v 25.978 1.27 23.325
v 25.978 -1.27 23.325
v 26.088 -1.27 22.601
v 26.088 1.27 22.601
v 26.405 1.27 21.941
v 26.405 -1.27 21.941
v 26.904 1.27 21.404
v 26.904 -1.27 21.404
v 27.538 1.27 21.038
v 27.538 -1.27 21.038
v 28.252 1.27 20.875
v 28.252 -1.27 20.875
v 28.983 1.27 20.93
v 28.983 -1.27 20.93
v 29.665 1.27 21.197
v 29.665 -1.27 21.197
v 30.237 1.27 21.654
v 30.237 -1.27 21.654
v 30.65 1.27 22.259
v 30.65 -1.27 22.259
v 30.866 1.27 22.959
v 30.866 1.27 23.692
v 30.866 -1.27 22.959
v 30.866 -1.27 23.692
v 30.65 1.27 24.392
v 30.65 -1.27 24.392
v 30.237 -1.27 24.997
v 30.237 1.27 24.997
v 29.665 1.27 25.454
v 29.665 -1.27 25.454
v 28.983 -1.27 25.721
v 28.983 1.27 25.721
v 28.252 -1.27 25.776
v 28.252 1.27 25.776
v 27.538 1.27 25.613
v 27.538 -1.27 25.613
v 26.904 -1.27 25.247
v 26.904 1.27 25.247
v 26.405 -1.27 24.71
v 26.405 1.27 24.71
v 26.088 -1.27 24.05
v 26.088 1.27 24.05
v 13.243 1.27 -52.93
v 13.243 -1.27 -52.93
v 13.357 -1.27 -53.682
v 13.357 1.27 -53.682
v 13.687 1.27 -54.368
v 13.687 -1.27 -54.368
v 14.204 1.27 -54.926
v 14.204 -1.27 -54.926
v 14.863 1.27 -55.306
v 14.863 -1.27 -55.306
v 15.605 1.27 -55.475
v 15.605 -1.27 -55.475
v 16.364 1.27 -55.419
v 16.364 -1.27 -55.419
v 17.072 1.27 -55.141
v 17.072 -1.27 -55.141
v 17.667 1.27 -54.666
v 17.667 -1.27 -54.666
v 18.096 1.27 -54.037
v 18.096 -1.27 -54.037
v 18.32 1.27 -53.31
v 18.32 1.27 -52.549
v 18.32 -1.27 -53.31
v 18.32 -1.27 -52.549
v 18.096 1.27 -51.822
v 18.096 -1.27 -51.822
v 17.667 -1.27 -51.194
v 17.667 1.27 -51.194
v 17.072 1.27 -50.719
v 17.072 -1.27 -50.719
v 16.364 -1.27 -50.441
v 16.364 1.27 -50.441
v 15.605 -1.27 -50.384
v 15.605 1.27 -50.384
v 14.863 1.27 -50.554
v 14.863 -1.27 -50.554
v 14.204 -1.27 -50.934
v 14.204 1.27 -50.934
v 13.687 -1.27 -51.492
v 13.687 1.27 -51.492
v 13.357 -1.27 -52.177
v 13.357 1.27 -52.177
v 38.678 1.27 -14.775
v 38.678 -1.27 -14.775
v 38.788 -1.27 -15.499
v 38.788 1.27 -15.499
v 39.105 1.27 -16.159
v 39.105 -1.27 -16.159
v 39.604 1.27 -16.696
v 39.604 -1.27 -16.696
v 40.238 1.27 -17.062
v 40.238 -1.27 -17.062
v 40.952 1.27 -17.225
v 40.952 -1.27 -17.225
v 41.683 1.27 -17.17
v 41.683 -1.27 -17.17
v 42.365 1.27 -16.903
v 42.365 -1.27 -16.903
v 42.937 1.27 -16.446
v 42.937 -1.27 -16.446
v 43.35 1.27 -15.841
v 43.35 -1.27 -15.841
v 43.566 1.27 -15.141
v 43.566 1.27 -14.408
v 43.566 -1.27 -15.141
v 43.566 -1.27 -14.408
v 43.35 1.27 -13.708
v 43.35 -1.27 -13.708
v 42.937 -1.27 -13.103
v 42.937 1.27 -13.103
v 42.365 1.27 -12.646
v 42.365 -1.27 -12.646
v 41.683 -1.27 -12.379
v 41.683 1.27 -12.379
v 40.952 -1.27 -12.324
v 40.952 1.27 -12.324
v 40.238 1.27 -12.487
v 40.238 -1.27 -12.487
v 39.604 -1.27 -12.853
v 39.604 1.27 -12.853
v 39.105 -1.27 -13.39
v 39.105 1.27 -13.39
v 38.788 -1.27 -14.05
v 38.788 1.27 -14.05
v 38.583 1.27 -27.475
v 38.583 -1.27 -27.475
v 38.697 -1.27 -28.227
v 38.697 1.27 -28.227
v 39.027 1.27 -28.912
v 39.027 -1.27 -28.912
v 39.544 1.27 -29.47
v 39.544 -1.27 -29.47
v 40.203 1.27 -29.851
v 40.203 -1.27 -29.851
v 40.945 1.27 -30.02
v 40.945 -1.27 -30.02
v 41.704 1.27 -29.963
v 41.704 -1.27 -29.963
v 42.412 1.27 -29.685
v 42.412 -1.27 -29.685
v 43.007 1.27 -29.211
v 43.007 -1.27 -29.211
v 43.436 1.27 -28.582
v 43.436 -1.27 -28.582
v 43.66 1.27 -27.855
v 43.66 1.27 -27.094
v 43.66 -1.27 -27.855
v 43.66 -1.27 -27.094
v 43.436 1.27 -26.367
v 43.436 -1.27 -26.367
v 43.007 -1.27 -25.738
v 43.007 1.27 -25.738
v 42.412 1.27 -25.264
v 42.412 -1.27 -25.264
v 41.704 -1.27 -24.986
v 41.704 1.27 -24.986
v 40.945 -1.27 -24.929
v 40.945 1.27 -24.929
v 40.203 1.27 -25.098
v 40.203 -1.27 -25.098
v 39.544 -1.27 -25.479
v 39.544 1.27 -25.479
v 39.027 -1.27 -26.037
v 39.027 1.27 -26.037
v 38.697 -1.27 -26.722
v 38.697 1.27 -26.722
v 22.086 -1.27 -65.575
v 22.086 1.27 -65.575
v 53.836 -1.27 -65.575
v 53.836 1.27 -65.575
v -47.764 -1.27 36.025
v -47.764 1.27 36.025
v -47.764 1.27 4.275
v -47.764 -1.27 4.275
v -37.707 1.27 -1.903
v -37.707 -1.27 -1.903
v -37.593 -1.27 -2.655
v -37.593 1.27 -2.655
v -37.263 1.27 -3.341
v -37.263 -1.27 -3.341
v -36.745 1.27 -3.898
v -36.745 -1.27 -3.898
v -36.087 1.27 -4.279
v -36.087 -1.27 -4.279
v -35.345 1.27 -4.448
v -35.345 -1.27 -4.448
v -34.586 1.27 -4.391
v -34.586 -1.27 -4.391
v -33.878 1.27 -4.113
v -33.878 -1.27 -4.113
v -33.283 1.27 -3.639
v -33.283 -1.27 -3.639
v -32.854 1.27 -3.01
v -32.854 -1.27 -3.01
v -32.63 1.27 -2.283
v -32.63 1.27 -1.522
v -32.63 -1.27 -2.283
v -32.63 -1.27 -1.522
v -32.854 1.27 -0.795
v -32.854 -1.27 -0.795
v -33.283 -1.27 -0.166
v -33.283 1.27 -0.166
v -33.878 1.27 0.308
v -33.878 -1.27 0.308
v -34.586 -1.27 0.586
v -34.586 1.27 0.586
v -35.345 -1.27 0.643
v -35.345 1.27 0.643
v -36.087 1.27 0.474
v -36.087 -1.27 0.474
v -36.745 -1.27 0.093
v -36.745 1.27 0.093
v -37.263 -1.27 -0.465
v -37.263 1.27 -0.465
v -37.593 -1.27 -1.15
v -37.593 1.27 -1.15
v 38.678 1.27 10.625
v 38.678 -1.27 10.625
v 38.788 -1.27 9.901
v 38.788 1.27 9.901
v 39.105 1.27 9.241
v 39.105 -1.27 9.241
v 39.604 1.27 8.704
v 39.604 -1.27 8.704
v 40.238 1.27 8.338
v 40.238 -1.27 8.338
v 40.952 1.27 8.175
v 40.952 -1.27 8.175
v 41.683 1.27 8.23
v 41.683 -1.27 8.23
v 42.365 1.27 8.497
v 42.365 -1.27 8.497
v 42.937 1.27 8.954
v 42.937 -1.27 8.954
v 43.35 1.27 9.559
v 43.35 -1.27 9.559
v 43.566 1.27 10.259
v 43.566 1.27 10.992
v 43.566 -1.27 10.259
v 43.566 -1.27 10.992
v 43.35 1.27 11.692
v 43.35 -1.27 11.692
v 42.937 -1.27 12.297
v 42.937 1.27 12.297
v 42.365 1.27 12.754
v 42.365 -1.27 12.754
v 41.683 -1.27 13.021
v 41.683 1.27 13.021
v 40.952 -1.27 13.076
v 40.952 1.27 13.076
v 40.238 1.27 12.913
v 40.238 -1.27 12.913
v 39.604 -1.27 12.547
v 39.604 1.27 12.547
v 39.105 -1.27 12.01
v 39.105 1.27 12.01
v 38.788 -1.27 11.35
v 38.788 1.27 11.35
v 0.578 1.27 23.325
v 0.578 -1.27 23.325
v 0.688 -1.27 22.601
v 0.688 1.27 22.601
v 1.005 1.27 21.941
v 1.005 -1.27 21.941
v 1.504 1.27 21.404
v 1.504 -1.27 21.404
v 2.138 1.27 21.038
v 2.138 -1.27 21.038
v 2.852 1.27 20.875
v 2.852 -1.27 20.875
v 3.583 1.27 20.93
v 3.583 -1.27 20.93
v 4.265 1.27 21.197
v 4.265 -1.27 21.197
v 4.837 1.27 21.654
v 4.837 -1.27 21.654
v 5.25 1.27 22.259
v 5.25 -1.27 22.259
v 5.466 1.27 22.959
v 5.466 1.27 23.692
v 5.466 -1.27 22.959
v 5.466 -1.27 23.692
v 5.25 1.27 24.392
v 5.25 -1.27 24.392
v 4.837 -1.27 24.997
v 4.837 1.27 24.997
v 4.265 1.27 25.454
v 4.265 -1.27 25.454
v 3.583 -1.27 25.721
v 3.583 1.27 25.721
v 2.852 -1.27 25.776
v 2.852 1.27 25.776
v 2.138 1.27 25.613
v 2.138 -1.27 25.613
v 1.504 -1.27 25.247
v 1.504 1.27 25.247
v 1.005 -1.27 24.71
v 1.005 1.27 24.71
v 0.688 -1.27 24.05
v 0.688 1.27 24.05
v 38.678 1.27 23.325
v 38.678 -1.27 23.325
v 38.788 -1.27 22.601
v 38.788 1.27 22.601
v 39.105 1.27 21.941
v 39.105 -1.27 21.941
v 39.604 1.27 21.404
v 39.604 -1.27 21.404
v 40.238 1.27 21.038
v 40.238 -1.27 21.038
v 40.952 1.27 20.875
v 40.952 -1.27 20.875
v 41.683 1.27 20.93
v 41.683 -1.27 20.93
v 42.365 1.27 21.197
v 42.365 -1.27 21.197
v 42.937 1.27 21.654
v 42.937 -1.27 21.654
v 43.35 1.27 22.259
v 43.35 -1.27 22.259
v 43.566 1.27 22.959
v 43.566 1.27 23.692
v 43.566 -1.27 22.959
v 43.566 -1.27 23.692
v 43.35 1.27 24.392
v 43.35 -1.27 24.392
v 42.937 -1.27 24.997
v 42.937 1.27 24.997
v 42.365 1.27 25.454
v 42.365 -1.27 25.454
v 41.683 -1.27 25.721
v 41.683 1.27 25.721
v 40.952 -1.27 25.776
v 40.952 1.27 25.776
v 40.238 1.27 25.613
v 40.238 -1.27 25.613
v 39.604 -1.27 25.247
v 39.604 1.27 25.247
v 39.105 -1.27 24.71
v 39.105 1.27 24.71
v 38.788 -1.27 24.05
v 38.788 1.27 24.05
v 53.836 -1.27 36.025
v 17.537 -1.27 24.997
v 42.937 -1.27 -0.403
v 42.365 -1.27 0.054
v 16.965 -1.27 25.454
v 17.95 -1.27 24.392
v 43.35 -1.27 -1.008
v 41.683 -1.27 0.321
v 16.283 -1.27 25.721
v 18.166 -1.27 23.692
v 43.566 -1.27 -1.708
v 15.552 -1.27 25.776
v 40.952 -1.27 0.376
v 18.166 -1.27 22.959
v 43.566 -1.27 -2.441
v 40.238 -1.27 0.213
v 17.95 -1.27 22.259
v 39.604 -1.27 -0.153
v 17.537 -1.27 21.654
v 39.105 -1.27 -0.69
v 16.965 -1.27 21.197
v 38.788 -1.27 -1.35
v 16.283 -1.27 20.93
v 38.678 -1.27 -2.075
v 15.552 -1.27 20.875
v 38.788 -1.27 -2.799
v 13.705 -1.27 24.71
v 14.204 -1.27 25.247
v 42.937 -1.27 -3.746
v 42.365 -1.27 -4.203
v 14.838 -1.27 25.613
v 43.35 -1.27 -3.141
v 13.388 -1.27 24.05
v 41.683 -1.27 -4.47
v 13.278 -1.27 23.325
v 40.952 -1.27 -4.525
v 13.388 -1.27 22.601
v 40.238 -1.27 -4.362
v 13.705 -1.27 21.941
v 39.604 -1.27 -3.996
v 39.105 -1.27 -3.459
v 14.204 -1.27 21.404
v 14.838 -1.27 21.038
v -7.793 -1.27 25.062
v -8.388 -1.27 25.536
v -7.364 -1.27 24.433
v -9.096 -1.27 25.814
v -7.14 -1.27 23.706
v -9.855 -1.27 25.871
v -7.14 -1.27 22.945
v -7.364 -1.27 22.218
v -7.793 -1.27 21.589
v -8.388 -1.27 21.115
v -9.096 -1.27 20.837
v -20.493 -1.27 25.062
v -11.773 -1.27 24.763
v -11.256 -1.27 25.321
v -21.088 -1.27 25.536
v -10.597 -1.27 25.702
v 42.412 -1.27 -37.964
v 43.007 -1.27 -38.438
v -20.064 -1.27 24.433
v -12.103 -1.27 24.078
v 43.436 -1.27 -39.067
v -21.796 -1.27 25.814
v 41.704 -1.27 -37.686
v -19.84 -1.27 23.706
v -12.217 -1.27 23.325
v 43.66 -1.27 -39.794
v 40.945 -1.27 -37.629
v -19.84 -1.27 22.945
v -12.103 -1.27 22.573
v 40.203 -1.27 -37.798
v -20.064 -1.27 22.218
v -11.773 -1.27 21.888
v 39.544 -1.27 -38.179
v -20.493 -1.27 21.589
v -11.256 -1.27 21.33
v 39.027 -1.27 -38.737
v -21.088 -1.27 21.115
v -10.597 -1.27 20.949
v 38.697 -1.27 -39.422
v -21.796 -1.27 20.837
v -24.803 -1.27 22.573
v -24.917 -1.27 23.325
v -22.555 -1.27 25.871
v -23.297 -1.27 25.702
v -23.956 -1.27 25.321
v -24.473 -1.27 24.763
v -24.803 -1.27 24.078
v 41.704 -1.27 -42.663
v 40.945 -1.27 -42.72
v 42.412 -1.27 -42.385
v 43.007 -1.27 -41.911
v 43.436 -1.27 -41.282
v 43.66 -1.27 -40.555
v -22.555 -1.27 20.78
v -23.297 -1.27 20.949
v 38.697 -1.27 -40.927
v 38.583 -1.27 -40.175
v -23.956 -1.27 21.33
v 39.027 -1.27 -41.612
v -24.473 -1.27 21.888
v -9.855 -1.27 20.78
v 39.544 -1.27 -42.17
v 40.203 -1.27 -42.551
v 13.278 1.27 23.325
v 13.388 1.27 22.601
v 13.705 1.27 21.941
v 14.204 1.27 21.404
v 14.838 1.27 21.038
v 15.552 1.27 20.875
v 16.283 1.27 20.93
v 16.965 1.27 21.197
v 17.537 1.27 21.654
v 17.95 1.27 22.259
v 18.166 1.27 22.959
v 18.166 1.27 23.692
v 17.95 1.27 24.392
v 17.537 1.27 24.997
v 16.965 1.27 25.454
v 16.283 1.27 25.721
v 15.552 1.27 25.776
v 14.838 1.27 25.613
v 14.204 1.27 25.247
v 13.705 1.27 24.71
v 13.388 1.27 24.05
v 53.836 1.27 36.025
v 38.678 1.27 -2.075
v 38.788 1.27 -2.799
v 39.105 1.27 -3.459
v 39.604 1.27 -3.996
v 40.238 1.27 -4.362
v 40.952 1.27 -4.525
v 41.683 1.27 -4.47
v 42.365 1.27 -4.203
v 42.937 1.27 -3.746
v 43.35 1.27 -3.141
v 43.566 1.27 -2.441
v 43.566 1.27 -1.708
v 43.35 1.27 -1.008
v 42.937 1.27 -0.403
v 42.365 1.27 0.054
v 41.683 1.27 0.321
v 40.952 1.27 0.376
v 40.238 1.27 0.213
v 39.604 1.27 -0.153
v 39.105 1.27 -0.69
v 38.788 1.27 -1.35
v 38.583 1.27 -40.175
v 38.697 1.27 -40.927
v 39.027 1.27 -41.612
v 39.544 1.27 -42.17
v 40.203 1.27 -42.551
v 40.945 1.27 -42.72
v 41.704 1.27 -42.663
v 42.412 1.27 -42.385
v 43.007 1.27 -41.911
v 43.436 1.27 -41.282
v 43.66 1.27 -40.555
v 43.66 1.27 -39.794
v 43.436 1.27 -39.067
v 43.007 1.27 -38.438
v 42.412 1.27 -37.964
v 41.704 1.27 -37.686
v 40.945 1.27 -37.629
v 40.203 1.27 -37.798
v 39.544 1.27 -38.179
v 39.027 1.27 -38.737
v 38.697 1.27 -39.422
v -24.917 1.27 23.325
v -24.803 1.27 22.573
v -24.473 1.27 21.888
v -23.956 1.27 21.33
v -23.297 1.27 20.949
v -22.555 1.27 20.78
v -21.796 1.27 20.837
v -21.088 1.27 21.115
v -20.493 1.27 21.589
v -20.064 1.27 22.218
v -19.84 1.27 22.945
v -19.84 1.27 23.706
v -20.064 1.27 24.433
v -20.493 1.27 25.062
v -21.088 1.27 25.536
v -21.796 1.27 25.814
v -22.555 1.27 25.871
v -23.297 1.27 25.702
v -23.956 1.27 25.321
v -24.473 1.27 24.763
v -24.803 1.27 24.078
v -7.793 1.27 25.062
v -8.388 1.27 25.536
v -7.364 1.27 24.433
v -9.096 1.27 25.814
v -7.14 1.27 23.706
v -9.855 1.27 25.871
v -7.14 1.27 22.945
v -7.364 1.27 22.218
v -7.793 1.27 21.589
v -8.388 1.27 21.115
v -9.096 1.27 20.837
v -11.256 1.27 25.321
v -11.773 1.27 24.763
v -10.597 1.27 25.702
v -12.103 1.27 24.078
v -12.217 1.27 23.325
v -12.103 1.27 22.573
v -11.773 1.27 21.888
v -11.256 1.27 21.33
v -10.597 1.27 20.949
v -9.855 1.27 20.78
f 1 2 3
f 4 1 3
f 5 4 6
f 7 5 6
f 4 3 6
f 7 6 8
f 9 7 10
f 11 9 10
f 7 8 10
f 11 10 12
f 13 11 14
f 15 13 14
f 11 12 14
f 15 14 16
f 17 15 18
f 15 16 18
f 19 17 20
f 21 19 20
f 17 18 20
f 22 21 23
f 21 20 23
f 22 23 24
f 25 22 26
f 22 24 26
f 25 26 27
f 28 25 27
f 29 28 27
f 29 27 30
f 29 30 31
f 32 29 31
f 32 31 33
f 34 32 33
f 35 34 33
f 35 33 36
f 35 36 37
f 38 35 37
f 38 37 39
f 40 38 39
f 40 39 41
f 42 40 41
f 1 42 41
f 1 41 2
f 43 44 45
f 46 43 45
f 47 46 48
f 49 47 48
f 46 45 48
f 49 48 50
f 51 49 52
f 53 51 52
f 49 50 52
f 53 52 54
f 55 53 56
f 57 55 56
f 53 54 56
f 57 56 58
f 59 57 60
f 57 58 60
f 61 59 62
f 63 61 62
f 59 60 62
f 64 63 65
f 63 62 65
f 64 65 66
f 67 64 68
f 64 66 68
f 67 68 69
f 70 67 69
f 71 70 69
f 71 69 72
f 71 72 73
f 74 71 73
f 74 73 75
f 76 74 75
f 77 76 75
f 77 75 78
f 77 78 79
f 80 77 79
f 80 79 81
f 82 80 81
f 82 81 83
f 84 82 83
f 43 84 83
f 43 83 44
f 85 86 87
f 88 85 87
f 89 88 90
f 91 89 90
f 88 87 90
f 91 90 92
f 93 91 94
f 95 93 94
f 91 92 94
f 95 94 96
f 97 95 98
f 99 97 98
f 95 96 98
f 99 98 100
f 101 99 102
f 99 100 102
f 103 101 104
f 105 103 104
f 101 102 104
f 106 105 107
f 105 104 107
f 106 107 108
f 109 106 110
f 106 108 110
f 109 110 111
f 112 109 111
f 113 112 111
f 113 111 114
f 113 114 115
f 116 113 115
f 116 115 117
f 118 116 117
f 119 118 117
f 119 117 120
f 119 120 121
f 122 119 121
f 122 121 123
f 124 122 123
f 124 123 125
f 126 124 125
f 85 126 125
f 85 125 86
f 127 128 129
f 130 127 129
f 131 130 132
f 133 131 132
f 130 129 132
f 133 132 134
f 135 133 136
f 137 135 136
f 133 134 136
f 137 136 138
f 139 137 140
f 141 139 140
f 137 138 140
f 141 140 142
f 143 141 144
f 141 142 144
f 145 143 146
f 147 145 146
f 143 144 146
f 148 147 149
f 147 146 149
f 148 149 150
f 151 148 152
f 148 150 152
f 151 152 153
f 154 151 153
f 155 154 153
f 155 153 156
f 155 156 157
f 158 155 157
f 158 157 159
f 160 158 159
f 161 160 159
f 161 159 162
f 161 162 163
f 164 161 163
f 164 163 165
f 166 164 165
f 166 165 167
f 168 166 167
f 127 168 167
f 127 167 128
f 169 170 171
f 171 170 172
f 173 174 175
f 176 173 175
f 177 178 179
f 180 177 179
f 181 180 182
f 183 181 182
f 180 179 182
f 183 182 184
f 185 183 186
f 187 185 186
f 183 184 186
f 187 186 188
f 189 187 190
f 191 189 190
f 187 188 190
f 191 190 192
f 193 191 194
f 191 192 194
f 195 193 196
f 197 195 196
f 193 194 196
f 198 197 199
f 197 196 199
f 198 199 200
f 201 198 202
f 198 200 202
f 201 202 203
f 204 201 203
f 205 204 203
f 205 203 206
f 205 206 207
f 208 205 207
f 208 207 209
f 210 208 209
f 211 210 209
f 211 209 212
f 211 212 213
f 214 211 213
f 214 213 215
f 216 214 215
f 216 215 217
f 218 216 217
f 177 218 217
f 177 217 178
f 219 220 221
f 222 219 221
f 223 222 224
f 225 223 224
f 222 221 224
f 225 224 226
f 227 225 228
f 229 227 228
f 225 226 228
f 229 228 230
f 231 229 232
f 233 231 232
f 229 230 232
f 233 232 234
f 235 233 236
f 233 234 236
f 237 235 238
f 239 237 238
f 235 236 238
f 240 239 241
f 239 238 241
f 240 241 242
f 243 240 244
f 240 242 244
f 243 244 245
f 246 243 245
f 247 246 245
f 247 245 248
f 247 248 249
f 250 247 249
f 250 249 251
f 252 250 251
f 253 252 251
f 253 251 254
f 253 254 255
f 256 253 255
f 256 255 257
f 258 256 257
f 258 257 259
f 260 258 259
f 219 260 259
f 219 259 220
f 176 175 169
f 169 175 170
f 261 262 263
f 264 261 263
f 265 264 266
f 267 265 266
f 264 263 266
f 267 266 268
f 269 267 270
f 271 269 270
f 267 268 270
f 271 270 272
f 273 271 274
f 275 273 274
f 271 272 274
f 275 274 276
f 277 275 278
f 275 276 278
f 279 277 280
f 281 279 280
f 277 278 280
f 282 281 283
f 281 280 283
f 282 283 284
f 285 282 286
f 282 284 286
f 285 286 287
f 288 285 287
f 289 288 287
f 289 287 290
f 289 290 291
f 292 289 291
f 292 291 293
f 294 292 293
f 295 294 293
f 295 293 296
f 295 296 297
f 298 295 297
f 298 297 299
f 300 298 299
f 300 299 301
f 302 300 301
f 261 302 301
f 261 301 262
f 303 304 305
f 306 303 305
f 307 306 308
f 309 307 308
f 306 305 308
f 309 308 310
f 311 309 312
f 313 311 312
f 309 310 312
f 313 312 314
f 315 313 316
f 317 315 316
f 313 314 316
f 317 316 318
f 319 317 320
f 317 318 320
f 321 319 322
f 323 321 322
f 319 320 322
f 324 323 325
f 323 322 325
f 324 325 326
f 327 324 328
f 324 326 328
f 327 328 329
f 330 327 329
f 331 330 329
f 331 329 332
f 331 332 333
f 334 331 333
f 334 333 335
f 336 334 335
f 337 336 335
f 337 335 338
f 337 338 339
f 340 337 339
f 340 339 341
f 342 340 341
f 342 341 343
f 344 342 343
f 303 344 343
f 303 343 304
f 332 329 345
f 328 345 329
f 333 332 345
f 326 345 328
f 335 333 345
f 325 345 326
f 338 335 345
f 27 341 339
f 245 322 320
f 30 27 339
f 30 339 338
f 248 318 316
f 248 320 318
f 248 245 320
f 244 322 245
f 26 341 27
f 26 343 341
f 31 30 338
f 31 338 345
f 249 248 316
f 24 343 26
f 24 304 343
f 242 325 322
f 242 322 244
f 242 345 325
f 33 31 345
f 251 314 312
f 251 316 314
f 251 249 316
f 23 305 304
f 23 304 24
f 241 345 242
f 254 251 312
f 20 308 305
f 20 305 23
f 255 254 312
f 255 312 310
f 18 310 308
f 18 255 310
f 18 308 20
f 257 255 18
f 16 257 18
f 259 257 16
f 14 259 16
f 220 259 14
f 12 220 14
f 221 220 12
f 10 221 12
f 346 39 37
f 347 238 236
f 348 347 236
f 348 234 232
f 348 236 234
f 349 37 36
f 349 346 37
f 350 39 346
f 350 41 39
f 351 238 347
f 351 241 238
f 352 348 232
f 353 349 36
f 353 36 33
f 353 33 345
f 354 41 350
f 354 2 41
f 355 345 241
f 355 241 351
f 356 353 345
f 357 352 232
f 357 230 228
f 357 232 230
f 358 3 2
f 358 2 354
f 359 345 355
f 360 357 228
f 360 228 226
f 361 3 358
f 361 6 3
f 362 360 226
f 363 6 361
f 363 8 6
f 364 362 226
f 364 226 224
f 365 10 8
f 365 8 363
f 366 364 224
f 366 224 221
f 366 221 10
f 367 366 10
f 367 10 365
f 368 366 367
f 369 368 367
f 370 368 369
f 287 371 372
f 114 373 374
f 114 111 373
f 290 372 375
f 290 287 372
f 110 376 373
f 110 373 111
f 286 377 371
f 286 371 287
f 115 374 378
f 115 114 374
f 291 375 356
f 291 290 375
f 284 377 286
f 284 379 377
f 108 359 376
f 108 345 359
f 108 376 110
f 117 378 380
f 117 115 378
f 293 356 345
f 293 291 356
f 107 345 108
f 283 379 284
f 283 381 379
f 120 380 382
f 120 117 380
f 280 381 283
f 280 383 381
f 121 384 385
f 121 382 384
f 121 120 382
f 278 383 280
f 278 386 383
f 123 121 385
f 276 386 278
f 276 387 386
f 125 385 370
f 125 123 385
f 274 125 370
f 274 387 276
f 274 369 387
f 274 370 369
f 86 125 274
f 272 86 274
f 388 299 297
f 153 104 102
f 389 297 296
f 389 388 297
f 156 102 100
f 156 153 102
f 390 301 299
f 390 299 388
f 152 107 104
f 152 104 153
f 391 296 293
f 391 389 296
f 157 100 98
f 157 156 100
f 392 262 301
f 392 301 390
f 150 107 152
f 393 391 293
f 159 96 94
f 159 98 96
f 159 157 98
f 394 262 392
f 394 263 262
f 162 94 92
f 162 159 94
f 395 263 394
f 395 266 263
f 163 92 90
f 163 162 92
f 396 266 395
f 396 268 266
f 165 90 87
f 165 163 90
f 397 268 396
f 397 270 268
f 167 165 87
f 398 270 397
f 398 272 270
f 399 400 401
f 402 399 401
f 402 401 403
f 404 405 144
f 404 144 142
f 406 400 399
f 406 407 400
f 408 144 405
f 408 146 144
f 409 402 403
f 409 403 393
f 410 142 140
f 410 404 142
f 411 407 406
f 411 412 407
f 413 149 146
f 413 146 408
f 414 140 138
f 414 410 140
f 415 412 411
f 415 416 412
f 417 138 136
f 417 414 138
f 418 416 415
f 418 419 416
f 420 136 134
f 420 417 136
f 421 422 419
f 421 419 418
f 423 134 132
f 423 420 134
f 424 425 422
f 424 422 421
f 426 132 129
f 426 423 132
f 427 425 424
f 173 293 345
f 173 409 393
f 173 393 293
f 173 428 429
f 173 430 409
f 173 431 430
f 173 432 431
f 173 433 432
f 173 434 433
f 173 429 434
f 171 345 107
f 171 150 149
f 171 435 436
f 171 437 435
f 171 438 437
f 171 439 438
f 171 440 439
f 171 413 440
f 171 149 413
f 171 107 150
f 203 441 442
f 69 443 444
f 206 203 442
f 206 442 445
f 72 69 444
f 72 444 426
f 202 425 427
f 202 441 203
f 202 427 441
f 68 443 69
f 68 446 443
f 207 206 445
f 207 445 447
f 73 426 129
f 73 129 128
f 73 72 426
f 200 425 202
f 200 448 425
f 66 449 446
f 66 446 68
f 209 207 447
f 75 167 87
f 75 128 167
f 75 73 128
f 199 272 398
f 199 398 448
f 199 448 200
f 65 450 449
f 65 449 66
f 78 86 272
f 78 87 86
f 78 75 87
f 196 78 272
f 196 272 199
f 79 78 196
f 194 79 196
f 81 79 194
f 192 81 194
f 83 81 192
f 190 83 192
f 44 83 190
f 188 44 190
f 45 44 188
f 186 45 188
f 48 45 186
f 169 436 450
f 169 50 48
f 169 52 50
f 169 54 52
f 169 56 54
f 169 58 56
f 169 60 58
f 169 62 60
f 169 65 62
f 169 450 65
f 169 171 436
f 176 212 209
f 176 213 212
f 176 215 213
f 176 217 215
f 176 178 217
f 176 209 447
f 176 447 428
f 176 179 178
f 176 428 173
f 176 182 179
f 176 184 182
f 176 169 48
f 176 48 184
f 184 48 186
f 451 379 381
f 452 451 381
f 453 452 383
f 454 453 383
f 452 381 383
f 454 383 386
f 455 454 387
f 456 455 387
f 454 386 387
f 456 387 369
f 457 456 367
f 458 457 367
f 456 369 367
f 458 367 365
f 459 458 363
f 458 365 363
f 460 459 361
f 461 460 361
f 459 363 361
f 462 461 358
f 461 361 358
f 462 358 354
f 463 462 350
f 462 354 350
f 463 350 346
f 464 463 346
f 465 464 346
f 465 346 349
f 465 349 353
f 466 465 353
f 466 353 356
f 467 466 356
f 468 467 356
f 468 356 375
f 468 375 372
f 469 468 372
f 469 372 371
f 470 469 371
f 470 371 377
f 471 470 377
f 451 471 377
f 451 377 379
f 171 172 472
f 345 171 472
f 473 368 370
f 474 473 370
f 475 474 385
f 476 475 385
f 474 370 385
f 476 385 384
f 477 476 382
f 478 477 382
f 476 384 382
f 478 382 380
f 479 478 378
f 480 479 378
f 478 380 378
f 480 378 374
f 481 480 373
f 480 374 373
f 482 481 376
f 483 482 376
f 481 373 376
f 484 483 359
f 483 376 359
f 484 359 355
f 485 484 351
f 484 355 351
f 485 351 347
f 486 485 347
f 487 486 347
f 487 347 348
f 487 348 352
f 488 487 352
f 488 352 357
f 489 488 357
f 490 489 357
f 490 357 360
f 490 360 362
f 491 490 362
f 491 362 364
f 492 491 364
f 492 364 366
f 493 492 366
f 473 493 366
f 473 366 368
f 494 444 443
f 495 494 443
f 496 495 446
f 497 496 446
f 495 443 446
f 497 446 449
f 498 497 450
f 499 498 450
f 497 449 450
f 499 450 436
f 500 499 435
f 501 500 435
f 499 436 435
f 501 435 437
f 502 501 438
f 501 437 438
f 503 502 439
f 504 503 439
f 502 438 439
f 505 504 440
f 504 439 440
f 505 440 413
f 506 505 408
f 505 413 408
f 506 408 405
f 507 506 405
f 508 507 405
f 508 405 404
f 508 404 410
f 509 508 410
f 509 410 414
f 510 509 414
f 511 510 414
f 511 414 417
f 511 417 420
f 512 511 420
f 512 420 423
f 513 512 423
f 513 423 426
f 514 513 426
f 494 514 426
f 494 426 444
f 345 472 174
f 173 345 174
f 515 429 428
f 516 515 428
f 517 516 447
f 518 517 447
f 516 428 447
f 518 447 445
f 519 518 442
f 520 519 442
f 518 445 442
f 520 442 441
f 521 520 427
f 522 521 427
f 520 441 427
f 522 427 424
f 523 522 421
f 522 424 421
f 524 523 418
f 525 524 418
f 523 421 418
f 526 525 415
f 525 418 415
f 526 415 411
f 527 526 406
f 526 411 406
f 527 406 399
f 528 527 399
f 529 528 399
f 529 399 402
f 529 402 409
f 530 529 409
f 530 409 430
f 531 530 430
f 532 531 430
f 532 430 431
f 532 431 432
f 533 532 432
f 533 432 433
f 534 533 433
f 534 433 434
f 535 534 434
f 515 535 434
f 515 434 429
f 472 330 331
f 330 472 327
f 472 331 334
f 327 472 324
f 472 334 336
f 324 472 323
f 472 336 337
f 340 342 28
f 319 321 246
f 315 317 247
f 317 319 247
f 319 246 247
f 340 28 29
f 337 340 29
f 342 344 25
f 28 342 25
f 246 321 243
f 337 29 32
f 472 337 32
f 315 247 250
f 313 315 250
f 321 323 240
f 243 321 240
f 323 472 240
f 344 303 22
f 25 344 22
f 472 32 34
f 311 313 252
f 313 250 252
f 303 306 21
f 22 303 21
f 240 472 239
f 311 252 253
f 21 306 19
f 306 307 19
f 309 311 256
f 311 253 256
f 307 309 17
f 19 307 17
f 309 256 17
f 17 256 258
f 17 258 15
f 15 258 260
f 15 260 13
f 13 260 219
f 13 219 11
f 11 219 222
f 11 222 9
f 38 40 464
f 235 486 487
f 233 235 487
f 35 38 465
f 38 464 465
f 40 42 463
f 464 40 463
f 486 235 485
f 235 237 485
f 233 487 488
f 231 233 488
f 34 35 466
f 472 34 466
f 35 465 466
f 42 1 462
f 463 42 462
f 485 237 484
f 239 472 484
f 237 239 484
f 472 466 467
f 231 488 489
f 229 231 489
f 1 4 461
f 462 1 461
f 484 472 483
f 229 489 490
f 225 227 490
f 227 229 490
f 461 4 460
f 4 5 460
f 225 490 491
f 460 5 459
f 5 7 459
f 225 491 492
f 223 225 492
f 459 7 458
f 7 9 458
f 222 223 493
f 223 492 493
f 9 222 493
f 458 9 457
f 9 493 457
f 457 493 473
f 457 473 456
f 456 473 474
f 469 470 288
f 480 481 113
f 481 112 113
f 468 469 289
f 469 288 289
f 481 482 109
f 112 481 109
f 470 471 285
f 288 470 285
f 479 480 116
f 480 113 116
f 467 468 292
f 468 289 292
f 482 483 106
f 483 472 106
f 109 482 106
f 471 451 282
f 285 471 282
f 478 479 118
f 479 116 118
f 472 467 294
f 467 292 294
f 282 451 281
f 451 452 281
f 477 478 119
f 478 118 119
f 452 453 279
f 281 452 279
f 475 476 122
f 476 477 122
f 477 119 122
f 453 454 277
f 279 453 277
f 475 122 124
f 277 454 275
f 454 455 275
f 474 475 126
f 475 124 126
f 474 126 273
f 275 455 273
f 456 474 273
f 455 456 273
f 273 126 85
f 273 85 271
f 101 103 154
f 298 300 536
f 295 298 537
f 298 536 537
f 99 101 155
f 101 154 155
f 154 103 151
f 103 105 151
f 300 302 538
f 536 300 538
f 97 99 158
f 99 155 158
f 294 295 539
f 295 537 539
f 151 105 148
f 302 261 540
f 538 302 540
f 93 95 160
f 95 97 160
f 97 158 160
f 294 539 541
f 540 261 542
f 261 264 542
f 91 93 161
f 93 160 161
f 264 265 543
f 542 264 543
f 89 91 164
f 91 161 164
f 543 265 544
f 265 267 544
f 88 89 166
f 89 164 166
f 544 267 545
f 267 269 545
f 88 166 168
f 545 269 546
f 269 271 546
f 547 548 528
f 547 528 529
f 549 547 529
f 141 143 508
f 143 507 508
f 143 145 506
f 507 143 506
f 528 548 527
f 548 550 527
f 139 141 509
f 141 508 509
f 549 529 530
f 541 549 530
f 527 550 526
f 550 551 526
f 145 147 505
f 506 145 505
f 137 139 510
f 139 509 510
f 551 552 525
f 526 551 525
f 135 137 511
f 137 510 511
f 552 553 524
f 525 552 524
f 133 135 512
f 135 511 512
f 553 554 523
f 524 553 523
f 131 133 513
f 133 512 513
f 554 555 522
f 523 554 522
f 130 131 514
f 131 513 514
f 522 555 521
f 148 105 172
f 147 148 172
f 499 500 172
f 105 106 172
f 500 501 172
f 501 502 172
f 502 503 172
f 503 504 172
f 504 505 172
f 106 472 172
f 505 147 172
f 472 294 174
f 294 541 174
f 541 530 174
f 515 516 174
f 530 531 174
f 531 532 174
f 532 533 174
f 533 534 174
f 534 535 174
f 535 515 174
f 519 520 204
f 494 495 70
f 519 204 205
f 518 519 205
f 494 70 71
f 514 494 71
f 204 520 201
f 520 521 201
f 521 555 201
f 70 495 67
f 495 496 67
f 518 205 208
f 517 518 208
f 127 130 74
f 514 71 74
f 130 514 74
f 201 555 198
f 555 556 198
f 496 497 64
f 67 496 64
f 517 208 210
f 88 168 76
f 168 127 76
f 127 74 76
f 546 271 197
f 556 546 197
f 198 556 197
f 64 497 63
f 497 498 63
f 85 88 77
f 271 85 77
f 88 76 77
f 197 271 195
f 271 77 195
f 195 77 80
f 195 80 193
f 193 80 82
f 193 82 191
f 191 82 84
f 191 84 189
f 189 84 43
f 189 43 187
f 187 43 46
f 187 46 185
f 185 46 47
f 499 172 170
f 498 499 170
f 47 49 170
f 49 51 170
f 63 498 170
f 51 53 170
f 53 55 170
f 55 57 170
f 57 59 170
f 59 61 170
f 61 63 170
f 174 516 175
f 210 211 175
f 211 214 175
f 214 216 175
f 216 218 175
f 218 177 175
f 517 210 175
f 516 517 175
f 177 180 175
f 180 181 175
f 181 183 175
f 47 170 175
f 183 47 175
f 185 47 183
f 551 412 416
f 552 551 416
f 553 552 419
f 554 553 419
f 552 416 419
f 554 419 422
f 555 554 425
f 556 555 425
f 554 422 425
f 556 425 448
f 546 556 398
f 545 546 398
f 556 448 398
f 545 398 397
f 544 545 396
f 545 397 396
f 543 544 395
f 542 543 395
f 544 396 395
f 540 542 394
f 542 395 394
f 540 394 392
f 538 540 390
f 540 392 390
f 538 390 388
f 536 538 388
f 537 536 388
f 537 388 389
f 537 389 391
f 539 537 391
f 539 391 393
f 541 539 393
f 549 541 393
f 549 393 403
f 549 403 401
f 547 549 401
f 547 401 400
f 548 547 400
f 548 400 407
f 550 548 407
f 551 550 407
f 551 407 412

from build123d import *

# Parameters (mm, degrees)
BOSS_EXTRUDE1_DEPTH          = 1.27
F_10_0_1935_DIAMETER_HOLE1_D = 4.9149
F_10_CLEARANCE_HOLE3_D       = 5.1054
SKETCH8_W                    = 182.273007985
SKETCH8_H                    = 142.759278982
SKETCH8_W_2                  = 101.6
SKETCH8_H_2                  = 101.6
CUT_EXTRUDE1_DEPTH           = 114.076021494


with BuildPart() as part:
    # Sketch1 → Boss-Extrude1 (new, symmetric)
    with BuildSketch(Plane(origin=(0, 0, 0), x_dir=(1, 0, 0), z_dir=(0, 1, 0))):
        with BuildLine():
            Line((53.835856574, 81.994245871), (53.835856574, -36.025498008))
            Line((53.835856574, -36.025498008), (-64.183887305, -36.025498008))
            ThreePointArc((-64.183887305, -36.025498008), (-70.050522337, -32.105537803), (-68.674015366, -25.185369947))
            Line((-68.674015366, -25.185369947), (42.995728513, 86.484373931))
            ThreePointArc((42.995728513, 86.484373931), (49.915896369, 87.860880902), (53.835856574, 81.994245871))
        make_face()
    extrude(amount=BOSS_EXTRUDE1_DEPTH, both=True)

    # #10 (0.1935) Diameter Hole1 (through all)
    with Locations(Plane(origin=(0, 1.27, 0), x_dir=(1, 0, 0), z_dir=(0, 1, 0))):
        with Locations((41.135856574, -23.325498008), (28.435856574, -23.325498008), (15.735856574, -23.325498008), (3.035856574, -23.325498008), (41.135856574, -10.625498008), (41.135856574, 2.074501992), (41.135856574, 14.774501992)):
            Hole(F_10_0_1935_DIAMETER_HOLE1_D / 2)

    # #10 Clearance Hole3 (through all)
    with Locations(Plane(origin=(0, 1.27, 0), x_dir=(1, 0, 0), z_dir=(0, 1, 0))):
        with Locations((-9.664143426, -23.325498008), (-22.364143426, -23.325498008), (41.135856574, 27.474501992), (41.135856574, 40.174501992), (15.795798418, 52.929822822), (-35.153913001, 1.902635256)):
            Hole(F_10_CLEARANCE_HOLE3_D / 2)

    # Sketch8 → Cut-Extrude1 (cut, through all)
    with BuildSketch(Plane(origin=(0, 1.27, 0), x_dir=(1, 0, 0), z_dir=(0, 1, 0))):
        with Locations((14.049390588, 20.35997908)):
            Rectangle(SKETCH8_W, SKETCH8_H)
        with Locations((3.035856574, 14.774501992)):
            Rectangle(SKETCH8_W_2, SKETCH8_H_2, mode=Mode.SUBTRACT)
    extrude(amount=-CUT_EXTRUDE1_DEPTH, mode=Mode.SUBTRACT)


solid = part.part
